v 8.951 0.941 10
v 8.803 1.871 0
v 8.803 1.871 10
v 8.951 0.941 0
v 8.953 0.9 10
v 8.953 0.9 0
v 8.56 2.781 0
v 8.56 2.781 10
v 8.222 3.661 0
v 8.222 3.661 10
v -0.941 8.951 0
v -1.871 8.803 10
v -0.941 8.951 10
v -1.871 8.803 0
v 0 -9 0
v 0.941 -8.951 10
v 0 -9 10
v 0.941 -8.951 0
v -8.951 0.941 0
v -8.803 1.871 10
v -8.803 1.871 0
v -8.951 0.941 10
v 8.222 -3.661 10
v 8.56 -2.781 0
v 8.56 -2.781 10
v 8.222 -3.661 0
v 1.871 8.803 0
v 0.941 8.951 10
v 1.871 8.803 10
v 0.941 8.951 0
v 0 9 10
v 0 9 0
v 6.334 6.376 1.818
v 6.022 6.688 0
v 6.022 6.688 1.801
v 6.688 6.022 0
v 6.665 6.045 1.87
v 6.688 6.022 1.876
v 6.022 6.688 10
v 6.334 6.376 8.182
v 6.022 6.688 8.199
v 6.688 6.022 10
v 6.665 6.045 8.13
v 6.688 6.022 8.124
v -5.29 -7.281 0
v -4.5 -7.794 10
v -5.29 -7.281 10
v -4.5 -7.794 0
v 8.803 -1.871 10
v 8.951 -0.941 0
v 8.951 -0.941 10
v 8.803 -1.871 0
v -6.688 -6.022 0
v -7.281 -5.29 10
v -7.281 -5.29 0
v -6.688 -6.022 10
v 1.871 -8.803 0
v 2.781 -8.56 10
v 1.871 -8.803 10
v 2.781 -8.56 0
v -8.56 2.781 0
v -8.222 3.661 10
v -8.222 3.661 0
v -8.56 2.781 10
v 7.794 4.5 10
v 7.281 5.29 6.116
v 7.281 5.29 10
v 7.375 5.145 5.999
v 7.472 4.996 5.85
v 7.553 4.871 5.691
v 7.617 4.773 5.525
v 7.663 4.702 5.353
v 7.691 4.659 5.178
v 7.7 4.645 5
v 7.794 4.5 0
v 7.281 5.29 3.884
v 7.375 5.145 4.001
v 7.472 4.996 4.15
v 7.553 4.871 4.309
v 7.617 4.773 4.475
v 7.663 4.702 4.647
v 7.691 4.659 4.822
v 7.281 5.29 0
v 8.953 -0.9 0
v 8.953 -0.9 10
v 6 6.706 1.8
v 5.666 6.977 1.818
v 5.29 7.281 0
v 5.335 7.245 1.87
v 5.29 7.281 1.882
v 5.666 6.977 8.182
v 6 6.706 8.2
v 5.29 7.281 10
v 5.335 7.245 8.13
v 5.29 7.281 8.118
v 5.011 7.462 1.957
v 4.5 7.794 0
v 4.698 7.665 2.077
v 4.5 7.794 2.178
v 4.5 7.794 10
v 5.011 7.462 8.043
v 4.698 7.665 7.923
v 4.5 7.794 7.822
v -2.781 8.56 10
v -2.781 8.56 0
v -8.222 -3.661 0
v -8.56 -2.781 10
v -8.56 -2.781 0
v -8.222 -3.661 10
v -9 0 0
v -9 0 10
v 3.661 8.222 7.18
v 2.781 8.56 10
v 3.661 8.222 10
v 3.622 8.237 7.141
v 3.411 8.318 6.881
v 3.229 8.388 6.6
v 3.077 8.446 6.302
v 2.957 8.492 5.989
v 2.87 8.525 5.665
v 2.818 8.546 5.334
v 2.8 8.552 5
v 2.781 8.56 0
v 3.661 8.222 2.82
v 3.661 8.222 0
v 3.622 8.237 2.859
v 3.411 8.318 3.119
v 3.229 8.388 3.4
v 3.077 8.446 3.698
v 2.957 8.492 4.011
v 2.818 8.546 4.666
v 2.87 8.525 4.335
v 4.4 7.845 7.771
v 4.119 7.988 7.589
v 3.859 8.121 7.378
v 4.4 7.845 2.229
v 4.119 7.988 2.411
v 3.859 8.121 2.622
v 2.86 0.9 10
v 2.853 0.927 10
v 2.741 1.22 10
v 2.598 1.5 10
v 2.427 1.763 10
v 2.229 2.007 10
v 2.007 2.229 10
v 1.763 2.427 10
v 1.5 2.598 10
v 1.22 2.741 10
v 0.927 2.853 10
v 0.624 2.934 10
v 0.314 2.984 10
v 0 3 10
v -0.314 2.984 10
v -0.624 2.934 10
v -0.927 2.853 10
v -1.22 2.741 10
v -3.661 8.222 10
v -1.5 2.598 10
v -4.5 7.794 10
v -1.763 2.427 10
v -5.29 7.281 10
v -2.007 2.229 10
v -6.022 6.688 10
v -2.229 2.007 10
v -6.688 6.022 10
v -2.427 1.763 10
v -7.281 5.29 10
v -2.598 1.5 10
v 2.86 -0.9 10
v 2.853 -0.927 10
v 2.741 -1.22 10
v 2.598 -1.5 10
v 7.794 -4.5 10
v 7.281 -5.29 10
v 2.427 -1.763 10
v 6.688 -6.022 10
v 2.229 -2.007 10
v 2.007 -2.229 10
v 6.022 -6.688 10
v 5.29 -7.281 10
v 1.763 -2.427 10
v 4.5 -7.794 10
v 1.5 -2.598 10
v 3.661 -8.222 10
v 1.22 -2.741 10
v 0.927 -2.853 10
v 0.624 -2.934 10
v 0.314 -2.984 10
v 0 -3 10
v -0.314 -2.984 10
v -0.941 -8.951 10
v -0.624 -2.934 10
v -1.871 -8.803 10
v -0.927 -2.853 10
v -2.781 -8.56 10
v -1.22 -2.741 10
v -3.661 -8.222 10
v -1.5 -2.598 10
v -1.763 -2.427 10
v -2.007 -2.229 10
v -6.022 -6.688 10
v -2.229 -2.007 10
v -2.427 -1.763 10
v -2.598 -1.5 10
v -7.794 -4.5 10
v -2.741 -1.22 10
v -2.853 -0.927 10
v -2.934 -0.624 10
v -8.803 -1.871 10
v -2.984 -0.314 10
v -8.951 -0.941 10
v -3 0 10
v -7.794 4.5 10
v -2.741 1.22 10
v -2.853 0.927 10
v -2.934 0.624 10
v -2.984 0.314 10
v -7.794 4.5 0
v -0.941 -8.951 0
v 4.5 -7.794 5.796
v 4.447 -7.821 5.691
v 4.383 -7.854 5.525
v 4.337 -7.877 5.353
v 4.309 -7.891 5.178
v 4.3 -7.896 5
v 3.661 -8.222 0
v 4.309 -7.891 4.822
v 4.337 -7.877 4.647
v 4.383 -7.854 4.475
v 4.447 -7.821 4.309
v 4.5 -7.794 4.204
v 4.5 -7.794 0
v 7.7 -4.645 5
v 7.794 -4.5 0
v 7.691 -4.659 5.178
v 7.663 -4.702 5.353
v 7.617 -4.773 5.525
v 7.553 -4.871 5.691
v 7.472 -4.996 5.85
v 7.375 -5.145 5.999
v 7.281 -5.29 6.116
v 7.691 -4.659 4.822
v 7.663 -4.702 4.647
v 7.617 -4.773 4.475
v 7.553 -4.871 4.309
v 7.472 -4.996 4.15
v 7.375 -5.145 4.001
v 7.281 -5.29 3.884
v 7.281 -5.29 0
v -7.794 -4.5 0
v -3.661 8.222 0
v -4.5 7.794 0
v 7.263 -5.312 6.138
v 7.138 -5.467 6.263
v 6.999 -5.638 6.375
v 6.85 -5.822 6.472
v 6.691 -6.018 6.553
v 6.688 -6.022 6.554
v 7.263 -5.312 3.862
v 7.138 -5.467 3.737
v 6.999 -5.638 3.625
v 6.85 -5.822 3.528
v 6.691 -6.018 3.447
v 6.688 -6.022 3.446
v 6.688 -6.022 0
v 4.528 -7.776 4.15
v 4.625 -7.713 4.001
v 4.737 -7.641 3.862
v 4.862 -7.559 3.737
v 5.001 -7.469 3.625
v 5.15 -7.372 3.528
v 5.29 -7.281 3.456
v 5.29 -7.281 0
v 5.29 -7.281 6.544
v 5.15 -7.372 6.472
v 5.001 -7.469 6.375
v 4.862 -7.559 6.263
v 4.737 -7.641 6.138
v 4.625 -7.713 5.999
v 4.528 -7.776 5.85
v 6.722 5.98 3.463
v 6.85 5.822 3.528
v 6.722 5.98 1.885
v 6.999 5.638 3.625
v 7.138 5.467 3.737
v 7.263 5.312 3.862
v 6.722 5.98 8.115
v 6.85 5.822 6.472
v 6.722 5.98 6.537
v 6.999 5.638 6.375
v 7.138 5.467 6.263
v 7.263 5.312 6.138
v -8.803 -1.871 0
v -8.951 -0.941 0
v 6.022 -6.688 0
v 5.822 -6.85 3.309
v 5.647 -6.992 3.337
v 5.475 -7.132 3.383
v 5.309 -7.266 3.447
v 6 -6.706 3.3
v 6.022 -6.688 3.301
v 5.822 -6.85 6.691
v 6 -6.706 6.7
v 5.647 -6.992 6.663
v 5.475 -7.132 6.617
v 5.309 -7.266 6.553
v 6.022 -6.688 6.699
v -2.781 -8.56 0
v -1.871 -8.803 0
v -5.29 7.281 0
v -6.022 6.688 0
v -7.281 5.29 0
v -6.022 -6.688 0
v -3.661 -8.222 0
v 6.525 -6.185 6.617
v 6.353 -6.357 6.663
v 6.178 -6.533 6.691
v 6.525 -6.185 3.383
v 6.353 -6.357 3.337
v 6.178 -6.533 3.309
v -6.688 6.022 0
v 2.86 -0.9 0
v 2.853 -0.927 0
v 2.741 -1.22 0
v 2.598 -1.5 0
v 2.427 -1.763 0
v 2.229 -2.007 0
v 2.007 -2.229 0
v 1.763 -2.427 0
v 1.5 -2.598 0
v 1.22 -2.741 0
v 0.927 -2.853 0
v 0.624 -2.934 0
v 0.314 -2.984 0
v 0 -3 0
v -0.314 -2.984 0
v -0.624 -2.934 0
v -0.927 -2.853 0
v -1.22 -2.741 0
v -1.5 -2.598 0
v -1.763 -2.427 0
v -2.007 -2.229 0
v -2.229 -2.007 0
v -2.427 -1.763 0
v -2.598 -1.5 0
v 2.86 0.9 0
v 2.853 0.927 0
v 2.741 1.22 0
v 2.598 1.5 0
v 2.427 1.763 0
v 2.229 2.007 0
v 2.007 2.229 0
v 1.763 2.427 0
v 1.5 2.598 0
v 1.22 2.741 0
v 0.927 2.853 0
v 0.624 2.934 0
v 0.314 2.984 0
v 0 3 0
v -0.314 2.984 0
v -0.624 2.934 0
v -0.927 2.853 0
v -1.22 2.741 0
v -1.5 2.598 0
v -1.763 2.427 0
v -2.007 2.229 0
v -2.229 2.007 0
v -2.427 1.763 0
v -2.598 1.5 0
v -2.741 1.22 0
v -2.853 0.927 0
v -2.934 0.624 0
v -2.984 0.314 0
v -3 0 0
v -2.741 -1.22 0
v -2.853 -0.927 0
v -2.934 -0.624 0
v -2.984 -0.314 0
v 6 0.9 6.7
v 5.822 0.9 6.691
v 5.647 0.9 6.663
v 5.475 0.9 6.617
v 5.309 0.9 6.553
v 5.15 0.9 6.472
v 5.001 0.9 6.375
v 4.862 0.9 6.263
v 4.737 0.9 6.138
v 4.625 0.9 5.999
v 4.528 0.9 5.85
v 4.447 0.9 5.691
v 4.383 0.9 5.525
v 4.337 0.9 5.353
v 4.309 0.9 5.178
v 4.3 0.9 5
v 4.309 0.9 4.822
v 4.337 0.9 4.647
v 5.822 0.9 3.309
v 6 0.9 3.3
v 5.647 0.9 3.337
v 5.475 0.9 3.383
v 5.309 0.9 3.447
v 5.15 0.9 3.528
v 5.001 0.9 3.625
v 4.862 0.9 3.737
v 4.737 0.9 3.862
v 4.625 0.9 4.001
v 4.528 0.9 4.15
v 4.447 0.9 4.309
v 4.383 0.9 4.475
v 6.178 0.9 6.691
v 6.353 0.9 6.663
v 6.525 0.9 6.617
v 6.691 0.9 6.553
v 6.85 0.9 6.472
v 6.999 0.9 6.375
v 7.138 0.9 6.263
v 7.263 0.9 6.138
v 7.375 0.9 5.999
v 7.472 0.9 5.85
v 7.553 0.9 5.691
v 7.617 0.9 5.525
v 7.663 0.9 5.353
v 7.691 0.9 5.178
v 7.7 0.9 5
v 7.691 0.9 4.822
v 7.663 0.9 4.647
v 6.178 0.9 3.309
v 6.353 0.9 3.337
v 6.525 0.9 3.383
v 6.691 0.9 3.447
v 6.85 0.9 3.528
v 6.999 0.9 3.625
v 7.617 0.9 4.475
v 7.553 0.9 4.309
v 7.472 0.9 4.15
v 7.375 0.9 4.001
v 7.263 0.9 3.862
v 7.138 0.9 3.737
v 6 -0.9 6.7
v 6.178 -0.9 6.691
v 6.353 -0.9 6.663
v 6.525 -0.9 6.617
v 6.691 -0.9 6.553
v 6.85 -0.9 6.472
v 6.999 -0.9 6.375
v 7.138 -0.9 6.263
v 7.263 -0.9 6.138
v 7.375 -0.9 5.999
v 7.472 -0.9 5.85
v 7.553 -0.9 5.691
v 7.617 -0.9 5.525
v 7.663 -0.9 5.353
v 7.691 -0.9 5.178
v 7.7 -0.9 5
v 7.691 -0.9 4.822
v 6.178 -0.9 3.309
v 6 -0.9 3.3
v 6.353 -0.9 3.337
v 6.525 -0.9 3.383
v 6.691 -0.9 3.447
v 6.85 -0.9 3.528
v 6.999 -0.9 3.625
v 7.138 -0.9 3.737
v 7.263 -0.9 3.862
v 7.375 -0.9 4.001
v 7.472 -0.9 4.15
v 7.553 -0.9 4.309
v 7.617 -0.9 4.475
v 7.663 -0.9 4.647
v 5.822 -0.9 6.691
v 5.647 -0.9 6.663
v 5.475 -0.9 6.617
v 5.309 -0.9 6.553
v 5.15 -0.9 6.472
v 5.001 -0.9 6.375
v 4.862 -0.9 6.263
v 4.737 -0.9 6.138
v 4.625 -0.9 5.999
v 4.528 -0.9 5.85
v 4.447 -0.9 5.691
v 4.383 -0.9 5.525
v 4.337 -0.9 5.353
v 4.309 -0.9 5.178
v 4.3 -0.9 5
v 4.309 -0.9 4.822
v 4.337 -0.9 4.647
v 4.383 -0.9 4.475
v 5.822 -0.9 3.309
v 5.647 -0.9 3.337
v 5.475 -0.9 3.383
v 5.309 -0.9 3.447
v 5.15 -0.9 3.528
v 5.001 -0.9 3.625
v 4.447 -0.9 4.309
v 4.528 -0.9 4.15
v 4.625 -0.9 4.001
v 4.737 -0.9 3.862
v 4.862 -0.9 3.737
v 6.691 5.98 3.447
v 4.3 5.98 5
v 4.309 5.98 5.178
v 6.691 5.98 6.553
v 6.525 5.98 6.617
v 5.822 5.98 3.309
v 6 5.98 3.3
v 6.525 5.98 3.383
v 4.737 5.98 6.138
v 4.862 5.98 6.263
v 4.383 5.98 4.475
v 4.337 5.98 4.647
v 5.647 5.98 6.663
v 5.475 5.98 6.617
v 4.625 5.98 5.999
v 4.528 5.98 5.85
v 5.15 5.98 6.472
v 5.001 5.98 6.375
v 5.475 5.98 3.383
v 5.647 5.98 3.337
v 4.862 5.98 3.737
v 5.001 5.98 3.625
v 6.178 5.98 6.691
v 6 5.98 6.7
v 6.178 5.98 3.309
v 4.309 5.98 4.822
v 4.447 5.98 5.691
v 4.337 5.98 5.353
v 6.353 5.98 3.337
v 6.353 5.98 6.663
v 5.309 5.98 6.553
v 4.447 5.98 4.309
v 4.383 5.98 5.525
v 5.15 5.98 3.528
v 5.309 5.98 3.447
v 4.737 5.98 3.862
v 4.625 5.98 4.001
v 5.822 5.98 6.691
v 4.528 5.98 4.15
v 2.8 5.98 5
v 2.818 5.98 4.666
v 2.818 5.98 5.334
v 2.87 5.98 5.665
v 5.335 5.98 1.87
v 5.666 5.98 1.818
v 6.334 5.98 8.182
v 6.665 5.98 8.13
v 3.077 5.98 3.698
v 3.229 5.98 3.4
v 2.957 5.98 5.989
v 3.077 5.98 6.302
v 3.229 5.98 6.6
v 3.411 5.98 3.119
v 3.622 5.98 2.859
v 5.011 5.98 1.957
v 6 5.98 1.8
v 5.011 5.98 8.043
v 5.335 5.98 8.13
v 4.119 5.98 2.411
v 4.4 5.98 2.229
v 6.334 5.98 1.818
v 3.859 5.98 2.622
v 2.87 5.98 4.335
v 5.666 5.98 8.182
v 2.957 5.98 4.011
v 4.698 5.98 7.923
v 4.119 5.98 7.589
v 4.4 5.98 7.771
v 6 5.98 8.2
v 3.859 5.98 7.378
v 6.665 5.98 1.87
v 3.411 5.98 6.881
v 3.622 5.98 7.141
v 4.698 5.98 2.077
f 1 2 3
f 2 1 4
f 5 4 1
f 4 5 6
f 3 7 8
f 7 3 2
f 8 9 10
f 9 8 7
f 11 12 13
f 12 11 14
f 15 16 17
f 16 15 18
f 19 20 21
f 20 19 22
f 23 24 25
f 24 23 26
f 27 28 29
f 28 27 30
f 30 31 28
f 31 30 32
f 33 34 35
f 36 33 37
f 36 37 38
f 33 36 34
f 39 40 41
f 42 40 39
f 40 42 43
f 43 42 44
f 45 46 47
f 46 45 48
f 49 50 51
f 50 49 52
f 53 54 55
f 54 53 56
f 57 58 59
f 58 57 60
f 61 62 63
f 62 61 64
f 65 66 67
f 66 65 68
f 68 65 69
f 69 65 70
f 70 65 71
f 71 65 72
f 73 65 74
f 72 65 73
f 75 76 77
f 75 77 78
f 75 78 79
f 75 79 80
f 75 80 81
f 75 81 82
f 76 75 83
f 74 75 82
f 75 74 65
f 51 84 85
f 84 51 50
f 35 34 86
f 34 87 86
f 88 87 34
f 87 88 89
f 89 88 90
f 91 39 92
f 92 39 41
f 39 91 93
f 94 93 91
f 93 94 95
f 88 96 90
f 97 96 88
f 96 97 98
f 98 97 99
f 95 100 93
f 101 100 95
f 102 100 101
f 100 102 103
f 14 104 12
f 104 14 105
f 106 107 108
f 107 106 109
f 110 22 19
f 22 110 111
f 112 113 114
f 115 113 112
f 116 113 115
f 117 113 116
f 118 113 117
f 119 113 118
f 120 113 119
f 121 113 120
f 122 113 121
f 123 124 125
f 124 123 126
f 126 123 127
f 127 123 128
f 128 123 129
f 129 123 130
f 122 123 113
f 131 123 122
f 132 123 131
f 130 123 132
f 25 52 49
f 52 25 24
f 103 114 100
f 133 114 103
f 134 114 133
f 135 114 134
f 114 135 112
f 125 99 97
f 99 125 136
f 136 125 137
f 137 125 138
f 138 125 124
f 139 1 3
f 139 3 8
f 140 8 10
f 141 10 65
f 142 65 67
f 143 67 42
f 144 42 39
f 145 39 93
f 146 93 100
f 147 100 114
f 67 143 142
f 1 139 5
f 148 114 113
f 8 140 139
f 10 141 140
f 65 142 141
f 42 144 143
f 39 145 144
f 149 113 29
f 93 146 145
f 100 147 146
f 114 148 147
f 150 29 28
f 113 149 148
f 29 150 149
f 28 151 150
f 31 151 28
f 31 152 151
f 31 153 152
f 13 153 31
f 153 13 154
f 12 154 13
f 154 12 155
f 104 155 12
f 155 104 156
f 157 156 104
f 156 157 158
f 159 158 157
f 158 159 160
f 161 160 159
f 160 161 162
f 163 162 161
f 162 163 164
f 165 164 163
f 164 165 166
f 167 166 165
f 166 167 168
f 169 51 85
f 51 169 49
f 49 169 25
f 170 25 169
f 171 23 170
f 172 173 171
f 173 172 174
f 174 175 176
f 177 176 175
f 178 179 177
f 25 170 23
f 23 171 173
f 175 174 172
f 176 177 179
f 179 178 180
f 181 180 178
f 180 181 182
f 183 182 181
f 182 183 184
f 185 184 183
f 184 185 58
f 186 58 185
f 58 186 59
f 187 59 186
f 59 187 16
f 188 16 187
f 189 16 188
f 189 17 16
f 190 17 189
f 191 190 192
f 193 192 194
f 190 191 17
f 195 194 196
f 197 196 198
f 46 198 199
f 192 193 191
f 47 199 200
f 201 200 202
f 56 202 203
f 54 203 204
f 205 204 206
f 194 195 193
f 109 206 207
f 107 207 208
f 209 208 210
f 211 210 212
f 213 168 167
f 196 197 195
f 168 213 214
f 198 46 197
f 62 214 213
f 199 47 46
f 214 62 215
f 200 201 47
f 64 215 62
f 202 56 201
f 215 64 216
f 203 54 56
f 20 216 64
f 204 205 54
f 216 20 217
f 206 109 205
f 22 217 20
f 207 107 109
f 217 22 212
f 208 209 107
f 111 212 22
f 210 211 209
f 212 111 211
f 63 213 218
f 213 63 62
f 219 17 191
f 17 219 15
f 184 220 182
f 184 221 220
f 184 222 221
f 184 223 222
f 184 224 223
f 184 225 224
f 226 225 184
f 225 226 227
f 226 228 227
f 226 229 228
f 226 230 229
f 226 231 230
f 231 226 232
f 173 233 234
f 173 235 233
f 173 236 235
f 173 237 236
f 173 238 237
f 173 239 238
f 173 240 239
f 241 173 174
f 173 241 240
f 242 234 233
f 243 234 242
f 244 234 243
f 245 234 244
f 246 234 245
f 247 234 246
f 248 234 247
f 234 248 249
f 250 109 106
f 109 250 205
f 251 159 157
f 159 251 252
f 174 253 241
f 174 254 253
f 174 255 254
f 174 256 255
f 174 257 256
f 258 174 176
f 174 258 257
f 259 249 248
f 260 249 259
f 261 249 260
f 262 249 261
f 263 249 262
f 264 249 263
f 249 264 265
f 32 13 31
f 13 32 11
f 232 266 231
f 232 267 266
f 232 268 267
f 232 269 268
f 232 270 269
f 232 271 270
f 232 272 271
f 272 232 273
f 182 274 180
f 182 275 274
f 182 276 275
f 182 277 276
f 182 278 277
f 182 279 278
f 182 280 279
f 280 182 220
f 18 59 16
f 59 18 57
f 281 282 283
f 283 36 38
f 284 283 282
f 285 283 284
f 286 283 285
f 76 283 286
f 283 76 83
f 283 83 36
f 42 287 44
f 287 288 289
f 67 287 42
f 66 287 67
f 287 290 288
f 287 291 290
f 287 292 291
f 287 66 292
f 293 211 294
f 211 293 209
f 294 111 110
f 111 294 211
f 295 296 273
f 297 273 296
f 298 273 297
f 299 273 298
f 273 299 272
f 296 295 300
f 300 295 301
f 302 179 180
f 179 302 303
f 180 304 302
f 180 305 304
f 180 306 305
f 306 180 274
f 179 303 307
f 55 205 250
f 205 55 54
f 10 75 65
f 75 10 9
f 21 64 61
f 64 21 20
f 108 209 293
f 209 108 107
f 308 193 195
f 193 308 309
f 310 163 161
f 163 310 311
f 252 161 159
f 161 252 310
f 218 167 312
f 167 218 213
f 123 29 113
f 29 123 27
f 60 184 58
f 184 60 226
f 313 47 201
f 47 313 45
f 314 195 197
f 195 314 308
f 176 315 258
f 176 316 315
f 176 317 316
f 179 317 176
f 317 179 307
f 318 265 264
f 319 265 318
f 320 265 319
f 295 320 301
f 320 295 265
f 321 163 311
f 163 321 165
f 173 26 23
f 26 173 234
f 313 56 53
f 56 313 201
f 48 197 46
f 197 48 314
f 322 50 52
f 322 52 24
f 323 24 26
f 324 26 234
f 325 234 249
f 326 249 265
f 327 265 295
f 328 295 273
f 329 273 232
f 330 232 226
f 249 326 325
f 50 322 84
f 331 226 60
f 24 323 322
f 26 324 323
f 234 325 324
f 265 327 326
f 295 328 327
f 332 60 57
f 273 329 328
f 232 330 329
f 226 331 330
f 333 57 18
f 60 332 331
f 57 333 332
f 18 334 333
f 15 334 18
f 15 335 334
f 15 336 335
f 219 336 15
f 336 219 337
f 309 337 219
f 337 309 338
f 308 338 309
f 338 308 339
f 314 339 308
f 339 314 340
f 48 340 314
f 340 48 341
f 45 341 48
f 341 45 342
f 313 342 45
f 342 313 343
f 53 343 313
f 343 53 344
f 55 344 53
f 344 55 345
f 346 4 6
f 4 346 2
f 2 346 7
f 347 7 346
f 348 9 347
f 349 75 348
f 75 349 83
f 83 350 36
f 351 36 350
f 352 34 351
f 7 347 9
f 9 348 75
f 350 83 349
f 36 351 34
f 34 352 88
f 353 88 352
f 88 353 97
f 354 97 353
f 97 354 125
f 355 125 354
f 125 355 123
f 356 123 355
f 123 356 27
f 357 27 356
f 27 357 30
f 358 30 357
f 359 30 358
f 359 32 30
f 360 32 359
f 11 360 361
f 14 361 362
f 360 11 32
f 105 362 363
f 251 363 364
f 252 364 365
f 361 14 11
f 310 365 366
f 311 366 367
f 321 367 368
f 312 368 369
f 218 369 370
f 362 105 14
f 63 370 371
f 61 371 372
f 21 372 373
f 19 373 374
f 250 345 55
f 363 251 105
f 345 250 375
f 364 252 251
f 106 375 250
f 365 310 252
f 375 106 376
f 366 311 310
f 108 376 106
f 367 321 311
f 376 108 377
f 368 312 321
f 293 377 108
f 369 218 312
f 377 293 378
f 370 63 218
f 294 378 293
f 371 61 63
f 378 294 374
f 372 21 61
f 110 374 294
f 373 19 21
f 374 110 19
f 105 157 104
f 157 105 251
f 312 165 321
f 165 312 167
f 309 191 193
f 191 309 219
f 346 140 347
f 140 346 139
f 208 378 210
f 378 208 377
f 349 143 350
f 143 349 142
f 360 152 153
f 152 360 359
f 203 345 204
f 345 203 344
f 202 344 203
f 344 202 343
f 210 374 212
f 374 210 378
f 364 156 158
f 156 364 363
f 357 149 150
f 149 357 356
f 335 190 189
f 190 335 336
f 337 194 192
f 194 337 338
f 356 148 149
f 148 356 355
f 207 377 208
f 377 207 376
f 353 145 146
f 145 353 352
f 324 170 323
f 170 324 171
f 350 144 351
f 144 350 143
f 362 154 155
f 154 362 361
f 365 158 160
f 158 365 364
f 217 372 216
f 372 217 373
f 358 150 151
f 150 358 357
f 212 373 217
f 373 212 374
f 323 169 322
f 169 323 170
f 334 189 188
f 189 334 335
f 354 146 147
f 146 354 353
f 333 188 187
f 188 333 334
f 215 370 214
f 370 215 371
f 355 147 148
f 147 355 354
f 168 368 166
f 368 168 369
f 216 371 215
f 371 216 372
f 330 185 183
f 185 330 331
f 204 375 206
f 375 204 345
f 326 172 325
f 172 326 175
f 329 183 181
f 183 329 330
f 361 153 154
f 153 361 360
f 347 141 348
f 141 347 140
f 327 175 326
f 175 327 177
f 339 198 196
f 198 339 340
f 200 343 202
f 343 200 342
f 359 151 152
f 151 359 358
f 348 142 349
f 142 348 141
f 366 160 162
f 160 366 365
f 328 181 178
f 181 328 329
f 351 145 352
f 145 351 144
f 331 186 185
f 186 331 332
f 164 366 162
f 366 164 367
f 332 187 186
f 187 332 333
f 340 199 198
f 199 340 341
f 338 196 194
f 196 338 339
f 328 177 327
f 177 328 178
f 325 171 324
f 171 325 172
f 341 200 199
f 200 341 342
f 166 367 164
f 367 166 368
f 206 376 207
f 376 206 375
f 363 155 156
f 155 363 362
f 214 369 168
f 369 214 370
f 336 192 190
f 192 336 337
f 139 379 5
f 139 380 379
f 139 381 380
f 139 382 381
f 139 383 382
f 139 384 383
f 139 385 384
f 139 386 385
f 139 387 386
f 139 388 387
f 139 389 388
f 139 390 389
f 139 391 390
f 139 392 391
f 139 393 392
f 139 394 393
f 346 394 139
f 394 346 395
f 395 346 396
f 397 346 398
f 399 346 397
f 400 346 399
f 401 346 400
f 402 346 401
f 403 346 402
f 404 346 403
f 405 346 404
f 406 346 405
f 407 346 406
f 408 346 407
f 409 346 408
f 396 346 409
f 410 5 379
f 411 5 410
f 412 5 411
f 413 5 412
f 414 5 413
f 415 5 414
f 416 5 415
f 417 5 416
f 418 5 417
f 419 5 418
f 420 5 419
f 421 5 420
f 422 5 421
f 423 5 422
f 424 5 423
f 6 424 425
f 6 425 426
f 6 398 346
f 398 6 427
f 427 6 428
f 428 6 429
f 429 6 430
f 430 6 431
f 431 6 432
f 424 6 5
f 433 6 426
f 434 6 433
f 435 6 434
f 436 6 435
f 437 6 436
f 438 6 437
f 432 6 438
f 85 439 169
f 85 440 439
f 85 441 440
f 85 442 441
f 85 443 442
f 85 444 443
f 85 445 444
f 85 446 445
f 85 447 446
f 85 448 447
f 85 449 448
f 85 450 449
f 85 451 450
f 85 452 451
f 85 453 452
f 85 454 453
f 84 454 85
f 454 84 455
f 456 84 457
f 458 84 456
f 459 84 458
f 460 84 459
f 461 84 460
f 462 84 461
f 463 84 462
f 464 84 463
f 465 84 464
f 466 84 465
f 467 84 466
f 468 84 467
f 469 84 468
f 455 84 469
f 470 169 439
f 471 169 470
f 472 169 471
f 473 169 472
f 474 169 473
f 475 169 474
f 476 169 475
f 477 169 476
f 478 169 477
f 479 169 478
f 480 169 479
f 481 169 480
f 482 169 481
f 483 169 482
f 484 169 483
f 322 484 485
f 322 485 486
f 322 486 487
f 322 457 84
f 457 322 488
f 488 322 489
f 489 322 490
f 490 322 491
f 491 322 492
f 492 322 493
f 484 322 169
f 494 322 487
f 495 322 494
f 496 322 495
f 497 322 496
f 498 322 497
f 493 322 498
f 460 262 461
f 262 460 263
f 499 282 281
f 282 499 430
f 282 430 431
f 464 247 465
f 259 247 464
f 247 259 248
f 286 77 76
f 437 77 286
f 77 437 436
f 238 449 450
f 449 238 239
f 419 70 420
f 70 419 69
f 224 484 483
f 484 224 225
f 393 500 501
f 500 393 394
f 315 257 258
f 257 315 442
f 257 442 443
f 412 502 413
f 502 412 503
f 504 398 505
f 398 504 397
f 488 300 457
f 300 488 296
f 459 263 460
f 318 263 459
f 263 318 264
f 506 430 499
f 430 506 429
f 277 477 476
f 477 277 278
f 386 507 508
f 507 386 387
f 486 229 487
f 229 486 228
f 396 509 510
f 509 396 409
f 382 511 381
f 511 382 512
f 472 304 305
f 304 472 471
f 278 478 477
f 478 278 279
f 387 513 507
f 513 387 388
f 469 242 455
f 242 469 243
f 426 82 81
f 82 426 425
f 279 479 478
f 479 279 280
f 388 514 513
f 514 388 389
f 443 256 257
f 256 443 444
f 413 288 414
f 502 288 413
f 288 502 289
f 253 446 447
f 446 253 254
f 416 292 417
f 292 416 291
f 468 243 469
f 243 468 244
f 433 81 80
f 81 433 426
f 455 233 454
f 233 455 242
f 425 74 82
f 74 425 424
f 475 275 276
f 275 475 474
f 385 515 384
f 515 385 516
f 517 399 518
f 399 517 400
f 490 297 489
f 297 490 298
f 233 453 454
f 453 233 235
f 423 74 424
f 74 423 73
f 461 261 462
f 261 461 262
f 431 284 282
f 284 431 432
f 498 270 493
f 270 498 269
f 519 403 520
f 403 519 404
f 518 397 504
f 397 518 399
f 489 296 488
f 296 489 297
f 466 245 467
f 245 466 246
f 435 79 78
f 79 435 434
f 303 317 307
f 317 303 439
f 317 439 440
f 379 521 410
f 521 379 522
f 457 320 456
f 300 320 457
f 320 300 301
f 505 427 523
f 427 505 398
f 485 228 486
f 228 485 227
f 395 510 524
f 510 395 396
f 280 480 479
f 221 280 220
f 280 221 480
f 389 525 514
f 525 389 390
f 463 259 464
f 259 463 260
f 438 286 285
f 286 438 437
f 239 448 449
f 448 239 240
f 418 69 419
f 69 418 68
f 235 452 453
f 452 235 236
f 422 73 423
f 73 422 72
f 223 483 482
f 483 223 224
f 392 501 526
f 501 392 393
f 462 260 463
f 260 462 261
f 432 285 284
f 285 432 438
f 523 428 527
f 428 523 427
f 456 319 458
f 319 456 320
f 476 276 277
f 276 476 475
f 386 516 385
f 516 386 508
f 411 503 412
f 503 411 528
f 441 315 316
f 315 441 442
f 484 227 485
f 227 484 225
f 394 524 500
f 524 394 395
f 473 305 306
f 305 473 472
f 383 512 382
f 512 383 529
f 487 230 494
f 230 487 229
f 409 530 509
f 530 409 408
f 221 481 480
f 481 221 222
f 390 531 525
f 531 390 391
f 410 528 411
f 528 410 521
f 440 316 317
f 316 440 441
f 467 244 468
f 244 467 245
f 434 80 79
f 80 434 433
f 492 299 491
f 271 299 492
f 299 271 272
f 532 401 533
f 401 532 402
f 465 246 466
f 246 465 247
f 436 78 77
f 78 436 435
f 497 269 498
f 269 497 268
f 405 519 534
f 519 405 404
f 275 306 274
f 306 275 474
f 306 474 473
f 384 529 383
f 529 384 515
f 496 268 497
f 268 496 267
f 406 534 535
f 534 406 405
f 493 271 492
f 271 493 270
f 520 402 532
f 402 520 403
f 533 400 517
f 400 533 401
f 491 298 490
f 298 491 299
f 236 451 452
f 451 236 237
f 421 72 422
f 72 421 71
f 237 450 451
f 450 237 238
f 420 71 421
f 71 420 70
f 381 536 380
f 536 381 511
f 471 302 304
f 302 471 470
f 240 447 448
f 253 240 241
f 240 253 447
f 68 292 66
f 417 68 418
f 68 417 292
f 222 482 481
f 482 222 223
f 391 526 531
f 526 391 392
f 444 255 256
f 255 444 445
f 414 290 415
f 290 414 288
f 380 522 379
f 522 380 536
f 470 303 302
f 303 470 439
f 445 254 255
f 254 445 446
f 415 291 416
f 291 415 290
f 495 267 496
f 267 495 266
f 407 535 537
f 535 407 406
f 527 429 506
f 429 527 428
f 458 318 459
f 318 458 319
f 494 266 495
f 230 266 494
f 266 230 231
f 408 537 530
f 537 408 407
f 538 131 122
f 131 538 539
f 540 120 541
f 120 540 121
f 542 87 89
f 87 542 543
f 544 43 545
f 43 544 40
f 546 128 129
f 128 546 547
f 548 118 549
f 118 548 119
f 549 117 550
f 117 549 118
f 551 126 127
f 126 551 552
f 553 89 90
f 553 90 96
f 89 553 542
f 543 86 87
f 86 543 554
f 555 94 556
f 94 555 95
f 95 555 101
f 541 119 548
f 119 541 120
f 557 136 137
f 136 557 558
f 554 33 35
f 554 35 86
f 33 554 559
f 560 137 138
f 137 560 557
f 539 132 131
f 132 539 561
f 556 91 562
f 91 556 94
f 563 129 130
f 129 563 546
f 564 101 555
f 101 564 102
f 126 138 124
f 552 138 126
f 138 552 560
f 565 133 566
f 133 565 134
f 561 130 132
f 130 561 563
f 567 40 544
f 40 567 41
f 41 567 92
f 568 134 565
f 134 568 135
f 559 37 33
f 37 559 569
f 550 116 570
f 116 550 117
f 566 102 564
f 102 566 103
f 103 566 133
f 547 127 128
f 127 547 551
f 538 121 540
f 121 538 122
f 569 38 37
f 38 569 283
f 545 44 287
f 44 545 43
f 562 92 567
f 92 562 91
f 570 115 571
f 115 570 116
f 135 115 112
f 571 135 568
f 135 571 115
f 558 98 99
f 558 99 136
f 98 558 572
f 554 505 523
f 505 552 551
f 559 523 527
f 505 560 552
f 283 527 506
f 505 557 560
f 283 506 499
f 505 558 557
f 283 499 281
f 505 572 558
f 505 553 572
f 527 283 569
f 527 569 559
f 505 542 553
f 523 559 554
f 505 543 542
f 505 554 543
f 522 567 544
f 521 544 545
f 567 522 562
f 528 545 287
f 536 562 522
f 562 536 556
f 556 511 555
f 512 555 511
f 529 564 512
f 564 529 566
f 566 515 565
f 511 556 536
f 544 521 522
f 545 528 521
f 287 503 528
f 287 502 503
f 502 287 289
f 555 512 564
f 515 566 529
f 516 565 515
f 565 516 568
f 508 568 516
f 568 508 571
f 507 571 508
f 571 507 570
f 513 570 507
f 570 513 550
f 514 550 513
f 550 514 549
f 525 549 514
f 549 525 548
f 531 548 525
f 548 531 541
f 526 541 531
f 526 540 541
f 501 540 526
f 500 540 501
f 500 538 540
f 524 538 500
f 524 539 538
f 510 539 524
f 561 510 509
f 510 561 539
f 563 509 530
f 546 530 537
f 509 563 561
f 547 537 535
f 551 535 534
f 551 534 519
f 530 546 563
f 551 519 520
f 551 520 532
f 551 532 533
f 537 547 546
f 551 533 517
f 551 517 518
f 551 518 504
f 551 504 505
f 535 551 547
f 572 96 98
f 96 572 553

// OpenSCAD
// C-style split collar for 6 mm shaft.
$fn = 60;
eps = 0.02;
shaft_d = 6;
outer_d = 18;
width = 10;
slit_w = 1.8;
screw_d = 3.4;
difference() {
    cylinder(d = outer_d, h = width);
    translate([0, 0, -eps]) cylinder(d = shaft_d, h = width + 2 * eps);
    translate([0, -slit_w / 2, -eps]) cube([outer_d / 2 + eps, slit_w, width + 2 * eps]);
    translate([outer_d / 2 - 3, -outer_d / 2 - eps, width / 2]) rotate([-90, 0, 0]) cylinder(d = screw_d, h = outer_d + 2 * eps);
    translate([outer_d / 2 - 3, outer_d / 2 - 3 - eps, width / 2]) rotate([-90, 0, 0]) cylinder(d = screw_d + 3, h = 3 + 2 * eps);
}
